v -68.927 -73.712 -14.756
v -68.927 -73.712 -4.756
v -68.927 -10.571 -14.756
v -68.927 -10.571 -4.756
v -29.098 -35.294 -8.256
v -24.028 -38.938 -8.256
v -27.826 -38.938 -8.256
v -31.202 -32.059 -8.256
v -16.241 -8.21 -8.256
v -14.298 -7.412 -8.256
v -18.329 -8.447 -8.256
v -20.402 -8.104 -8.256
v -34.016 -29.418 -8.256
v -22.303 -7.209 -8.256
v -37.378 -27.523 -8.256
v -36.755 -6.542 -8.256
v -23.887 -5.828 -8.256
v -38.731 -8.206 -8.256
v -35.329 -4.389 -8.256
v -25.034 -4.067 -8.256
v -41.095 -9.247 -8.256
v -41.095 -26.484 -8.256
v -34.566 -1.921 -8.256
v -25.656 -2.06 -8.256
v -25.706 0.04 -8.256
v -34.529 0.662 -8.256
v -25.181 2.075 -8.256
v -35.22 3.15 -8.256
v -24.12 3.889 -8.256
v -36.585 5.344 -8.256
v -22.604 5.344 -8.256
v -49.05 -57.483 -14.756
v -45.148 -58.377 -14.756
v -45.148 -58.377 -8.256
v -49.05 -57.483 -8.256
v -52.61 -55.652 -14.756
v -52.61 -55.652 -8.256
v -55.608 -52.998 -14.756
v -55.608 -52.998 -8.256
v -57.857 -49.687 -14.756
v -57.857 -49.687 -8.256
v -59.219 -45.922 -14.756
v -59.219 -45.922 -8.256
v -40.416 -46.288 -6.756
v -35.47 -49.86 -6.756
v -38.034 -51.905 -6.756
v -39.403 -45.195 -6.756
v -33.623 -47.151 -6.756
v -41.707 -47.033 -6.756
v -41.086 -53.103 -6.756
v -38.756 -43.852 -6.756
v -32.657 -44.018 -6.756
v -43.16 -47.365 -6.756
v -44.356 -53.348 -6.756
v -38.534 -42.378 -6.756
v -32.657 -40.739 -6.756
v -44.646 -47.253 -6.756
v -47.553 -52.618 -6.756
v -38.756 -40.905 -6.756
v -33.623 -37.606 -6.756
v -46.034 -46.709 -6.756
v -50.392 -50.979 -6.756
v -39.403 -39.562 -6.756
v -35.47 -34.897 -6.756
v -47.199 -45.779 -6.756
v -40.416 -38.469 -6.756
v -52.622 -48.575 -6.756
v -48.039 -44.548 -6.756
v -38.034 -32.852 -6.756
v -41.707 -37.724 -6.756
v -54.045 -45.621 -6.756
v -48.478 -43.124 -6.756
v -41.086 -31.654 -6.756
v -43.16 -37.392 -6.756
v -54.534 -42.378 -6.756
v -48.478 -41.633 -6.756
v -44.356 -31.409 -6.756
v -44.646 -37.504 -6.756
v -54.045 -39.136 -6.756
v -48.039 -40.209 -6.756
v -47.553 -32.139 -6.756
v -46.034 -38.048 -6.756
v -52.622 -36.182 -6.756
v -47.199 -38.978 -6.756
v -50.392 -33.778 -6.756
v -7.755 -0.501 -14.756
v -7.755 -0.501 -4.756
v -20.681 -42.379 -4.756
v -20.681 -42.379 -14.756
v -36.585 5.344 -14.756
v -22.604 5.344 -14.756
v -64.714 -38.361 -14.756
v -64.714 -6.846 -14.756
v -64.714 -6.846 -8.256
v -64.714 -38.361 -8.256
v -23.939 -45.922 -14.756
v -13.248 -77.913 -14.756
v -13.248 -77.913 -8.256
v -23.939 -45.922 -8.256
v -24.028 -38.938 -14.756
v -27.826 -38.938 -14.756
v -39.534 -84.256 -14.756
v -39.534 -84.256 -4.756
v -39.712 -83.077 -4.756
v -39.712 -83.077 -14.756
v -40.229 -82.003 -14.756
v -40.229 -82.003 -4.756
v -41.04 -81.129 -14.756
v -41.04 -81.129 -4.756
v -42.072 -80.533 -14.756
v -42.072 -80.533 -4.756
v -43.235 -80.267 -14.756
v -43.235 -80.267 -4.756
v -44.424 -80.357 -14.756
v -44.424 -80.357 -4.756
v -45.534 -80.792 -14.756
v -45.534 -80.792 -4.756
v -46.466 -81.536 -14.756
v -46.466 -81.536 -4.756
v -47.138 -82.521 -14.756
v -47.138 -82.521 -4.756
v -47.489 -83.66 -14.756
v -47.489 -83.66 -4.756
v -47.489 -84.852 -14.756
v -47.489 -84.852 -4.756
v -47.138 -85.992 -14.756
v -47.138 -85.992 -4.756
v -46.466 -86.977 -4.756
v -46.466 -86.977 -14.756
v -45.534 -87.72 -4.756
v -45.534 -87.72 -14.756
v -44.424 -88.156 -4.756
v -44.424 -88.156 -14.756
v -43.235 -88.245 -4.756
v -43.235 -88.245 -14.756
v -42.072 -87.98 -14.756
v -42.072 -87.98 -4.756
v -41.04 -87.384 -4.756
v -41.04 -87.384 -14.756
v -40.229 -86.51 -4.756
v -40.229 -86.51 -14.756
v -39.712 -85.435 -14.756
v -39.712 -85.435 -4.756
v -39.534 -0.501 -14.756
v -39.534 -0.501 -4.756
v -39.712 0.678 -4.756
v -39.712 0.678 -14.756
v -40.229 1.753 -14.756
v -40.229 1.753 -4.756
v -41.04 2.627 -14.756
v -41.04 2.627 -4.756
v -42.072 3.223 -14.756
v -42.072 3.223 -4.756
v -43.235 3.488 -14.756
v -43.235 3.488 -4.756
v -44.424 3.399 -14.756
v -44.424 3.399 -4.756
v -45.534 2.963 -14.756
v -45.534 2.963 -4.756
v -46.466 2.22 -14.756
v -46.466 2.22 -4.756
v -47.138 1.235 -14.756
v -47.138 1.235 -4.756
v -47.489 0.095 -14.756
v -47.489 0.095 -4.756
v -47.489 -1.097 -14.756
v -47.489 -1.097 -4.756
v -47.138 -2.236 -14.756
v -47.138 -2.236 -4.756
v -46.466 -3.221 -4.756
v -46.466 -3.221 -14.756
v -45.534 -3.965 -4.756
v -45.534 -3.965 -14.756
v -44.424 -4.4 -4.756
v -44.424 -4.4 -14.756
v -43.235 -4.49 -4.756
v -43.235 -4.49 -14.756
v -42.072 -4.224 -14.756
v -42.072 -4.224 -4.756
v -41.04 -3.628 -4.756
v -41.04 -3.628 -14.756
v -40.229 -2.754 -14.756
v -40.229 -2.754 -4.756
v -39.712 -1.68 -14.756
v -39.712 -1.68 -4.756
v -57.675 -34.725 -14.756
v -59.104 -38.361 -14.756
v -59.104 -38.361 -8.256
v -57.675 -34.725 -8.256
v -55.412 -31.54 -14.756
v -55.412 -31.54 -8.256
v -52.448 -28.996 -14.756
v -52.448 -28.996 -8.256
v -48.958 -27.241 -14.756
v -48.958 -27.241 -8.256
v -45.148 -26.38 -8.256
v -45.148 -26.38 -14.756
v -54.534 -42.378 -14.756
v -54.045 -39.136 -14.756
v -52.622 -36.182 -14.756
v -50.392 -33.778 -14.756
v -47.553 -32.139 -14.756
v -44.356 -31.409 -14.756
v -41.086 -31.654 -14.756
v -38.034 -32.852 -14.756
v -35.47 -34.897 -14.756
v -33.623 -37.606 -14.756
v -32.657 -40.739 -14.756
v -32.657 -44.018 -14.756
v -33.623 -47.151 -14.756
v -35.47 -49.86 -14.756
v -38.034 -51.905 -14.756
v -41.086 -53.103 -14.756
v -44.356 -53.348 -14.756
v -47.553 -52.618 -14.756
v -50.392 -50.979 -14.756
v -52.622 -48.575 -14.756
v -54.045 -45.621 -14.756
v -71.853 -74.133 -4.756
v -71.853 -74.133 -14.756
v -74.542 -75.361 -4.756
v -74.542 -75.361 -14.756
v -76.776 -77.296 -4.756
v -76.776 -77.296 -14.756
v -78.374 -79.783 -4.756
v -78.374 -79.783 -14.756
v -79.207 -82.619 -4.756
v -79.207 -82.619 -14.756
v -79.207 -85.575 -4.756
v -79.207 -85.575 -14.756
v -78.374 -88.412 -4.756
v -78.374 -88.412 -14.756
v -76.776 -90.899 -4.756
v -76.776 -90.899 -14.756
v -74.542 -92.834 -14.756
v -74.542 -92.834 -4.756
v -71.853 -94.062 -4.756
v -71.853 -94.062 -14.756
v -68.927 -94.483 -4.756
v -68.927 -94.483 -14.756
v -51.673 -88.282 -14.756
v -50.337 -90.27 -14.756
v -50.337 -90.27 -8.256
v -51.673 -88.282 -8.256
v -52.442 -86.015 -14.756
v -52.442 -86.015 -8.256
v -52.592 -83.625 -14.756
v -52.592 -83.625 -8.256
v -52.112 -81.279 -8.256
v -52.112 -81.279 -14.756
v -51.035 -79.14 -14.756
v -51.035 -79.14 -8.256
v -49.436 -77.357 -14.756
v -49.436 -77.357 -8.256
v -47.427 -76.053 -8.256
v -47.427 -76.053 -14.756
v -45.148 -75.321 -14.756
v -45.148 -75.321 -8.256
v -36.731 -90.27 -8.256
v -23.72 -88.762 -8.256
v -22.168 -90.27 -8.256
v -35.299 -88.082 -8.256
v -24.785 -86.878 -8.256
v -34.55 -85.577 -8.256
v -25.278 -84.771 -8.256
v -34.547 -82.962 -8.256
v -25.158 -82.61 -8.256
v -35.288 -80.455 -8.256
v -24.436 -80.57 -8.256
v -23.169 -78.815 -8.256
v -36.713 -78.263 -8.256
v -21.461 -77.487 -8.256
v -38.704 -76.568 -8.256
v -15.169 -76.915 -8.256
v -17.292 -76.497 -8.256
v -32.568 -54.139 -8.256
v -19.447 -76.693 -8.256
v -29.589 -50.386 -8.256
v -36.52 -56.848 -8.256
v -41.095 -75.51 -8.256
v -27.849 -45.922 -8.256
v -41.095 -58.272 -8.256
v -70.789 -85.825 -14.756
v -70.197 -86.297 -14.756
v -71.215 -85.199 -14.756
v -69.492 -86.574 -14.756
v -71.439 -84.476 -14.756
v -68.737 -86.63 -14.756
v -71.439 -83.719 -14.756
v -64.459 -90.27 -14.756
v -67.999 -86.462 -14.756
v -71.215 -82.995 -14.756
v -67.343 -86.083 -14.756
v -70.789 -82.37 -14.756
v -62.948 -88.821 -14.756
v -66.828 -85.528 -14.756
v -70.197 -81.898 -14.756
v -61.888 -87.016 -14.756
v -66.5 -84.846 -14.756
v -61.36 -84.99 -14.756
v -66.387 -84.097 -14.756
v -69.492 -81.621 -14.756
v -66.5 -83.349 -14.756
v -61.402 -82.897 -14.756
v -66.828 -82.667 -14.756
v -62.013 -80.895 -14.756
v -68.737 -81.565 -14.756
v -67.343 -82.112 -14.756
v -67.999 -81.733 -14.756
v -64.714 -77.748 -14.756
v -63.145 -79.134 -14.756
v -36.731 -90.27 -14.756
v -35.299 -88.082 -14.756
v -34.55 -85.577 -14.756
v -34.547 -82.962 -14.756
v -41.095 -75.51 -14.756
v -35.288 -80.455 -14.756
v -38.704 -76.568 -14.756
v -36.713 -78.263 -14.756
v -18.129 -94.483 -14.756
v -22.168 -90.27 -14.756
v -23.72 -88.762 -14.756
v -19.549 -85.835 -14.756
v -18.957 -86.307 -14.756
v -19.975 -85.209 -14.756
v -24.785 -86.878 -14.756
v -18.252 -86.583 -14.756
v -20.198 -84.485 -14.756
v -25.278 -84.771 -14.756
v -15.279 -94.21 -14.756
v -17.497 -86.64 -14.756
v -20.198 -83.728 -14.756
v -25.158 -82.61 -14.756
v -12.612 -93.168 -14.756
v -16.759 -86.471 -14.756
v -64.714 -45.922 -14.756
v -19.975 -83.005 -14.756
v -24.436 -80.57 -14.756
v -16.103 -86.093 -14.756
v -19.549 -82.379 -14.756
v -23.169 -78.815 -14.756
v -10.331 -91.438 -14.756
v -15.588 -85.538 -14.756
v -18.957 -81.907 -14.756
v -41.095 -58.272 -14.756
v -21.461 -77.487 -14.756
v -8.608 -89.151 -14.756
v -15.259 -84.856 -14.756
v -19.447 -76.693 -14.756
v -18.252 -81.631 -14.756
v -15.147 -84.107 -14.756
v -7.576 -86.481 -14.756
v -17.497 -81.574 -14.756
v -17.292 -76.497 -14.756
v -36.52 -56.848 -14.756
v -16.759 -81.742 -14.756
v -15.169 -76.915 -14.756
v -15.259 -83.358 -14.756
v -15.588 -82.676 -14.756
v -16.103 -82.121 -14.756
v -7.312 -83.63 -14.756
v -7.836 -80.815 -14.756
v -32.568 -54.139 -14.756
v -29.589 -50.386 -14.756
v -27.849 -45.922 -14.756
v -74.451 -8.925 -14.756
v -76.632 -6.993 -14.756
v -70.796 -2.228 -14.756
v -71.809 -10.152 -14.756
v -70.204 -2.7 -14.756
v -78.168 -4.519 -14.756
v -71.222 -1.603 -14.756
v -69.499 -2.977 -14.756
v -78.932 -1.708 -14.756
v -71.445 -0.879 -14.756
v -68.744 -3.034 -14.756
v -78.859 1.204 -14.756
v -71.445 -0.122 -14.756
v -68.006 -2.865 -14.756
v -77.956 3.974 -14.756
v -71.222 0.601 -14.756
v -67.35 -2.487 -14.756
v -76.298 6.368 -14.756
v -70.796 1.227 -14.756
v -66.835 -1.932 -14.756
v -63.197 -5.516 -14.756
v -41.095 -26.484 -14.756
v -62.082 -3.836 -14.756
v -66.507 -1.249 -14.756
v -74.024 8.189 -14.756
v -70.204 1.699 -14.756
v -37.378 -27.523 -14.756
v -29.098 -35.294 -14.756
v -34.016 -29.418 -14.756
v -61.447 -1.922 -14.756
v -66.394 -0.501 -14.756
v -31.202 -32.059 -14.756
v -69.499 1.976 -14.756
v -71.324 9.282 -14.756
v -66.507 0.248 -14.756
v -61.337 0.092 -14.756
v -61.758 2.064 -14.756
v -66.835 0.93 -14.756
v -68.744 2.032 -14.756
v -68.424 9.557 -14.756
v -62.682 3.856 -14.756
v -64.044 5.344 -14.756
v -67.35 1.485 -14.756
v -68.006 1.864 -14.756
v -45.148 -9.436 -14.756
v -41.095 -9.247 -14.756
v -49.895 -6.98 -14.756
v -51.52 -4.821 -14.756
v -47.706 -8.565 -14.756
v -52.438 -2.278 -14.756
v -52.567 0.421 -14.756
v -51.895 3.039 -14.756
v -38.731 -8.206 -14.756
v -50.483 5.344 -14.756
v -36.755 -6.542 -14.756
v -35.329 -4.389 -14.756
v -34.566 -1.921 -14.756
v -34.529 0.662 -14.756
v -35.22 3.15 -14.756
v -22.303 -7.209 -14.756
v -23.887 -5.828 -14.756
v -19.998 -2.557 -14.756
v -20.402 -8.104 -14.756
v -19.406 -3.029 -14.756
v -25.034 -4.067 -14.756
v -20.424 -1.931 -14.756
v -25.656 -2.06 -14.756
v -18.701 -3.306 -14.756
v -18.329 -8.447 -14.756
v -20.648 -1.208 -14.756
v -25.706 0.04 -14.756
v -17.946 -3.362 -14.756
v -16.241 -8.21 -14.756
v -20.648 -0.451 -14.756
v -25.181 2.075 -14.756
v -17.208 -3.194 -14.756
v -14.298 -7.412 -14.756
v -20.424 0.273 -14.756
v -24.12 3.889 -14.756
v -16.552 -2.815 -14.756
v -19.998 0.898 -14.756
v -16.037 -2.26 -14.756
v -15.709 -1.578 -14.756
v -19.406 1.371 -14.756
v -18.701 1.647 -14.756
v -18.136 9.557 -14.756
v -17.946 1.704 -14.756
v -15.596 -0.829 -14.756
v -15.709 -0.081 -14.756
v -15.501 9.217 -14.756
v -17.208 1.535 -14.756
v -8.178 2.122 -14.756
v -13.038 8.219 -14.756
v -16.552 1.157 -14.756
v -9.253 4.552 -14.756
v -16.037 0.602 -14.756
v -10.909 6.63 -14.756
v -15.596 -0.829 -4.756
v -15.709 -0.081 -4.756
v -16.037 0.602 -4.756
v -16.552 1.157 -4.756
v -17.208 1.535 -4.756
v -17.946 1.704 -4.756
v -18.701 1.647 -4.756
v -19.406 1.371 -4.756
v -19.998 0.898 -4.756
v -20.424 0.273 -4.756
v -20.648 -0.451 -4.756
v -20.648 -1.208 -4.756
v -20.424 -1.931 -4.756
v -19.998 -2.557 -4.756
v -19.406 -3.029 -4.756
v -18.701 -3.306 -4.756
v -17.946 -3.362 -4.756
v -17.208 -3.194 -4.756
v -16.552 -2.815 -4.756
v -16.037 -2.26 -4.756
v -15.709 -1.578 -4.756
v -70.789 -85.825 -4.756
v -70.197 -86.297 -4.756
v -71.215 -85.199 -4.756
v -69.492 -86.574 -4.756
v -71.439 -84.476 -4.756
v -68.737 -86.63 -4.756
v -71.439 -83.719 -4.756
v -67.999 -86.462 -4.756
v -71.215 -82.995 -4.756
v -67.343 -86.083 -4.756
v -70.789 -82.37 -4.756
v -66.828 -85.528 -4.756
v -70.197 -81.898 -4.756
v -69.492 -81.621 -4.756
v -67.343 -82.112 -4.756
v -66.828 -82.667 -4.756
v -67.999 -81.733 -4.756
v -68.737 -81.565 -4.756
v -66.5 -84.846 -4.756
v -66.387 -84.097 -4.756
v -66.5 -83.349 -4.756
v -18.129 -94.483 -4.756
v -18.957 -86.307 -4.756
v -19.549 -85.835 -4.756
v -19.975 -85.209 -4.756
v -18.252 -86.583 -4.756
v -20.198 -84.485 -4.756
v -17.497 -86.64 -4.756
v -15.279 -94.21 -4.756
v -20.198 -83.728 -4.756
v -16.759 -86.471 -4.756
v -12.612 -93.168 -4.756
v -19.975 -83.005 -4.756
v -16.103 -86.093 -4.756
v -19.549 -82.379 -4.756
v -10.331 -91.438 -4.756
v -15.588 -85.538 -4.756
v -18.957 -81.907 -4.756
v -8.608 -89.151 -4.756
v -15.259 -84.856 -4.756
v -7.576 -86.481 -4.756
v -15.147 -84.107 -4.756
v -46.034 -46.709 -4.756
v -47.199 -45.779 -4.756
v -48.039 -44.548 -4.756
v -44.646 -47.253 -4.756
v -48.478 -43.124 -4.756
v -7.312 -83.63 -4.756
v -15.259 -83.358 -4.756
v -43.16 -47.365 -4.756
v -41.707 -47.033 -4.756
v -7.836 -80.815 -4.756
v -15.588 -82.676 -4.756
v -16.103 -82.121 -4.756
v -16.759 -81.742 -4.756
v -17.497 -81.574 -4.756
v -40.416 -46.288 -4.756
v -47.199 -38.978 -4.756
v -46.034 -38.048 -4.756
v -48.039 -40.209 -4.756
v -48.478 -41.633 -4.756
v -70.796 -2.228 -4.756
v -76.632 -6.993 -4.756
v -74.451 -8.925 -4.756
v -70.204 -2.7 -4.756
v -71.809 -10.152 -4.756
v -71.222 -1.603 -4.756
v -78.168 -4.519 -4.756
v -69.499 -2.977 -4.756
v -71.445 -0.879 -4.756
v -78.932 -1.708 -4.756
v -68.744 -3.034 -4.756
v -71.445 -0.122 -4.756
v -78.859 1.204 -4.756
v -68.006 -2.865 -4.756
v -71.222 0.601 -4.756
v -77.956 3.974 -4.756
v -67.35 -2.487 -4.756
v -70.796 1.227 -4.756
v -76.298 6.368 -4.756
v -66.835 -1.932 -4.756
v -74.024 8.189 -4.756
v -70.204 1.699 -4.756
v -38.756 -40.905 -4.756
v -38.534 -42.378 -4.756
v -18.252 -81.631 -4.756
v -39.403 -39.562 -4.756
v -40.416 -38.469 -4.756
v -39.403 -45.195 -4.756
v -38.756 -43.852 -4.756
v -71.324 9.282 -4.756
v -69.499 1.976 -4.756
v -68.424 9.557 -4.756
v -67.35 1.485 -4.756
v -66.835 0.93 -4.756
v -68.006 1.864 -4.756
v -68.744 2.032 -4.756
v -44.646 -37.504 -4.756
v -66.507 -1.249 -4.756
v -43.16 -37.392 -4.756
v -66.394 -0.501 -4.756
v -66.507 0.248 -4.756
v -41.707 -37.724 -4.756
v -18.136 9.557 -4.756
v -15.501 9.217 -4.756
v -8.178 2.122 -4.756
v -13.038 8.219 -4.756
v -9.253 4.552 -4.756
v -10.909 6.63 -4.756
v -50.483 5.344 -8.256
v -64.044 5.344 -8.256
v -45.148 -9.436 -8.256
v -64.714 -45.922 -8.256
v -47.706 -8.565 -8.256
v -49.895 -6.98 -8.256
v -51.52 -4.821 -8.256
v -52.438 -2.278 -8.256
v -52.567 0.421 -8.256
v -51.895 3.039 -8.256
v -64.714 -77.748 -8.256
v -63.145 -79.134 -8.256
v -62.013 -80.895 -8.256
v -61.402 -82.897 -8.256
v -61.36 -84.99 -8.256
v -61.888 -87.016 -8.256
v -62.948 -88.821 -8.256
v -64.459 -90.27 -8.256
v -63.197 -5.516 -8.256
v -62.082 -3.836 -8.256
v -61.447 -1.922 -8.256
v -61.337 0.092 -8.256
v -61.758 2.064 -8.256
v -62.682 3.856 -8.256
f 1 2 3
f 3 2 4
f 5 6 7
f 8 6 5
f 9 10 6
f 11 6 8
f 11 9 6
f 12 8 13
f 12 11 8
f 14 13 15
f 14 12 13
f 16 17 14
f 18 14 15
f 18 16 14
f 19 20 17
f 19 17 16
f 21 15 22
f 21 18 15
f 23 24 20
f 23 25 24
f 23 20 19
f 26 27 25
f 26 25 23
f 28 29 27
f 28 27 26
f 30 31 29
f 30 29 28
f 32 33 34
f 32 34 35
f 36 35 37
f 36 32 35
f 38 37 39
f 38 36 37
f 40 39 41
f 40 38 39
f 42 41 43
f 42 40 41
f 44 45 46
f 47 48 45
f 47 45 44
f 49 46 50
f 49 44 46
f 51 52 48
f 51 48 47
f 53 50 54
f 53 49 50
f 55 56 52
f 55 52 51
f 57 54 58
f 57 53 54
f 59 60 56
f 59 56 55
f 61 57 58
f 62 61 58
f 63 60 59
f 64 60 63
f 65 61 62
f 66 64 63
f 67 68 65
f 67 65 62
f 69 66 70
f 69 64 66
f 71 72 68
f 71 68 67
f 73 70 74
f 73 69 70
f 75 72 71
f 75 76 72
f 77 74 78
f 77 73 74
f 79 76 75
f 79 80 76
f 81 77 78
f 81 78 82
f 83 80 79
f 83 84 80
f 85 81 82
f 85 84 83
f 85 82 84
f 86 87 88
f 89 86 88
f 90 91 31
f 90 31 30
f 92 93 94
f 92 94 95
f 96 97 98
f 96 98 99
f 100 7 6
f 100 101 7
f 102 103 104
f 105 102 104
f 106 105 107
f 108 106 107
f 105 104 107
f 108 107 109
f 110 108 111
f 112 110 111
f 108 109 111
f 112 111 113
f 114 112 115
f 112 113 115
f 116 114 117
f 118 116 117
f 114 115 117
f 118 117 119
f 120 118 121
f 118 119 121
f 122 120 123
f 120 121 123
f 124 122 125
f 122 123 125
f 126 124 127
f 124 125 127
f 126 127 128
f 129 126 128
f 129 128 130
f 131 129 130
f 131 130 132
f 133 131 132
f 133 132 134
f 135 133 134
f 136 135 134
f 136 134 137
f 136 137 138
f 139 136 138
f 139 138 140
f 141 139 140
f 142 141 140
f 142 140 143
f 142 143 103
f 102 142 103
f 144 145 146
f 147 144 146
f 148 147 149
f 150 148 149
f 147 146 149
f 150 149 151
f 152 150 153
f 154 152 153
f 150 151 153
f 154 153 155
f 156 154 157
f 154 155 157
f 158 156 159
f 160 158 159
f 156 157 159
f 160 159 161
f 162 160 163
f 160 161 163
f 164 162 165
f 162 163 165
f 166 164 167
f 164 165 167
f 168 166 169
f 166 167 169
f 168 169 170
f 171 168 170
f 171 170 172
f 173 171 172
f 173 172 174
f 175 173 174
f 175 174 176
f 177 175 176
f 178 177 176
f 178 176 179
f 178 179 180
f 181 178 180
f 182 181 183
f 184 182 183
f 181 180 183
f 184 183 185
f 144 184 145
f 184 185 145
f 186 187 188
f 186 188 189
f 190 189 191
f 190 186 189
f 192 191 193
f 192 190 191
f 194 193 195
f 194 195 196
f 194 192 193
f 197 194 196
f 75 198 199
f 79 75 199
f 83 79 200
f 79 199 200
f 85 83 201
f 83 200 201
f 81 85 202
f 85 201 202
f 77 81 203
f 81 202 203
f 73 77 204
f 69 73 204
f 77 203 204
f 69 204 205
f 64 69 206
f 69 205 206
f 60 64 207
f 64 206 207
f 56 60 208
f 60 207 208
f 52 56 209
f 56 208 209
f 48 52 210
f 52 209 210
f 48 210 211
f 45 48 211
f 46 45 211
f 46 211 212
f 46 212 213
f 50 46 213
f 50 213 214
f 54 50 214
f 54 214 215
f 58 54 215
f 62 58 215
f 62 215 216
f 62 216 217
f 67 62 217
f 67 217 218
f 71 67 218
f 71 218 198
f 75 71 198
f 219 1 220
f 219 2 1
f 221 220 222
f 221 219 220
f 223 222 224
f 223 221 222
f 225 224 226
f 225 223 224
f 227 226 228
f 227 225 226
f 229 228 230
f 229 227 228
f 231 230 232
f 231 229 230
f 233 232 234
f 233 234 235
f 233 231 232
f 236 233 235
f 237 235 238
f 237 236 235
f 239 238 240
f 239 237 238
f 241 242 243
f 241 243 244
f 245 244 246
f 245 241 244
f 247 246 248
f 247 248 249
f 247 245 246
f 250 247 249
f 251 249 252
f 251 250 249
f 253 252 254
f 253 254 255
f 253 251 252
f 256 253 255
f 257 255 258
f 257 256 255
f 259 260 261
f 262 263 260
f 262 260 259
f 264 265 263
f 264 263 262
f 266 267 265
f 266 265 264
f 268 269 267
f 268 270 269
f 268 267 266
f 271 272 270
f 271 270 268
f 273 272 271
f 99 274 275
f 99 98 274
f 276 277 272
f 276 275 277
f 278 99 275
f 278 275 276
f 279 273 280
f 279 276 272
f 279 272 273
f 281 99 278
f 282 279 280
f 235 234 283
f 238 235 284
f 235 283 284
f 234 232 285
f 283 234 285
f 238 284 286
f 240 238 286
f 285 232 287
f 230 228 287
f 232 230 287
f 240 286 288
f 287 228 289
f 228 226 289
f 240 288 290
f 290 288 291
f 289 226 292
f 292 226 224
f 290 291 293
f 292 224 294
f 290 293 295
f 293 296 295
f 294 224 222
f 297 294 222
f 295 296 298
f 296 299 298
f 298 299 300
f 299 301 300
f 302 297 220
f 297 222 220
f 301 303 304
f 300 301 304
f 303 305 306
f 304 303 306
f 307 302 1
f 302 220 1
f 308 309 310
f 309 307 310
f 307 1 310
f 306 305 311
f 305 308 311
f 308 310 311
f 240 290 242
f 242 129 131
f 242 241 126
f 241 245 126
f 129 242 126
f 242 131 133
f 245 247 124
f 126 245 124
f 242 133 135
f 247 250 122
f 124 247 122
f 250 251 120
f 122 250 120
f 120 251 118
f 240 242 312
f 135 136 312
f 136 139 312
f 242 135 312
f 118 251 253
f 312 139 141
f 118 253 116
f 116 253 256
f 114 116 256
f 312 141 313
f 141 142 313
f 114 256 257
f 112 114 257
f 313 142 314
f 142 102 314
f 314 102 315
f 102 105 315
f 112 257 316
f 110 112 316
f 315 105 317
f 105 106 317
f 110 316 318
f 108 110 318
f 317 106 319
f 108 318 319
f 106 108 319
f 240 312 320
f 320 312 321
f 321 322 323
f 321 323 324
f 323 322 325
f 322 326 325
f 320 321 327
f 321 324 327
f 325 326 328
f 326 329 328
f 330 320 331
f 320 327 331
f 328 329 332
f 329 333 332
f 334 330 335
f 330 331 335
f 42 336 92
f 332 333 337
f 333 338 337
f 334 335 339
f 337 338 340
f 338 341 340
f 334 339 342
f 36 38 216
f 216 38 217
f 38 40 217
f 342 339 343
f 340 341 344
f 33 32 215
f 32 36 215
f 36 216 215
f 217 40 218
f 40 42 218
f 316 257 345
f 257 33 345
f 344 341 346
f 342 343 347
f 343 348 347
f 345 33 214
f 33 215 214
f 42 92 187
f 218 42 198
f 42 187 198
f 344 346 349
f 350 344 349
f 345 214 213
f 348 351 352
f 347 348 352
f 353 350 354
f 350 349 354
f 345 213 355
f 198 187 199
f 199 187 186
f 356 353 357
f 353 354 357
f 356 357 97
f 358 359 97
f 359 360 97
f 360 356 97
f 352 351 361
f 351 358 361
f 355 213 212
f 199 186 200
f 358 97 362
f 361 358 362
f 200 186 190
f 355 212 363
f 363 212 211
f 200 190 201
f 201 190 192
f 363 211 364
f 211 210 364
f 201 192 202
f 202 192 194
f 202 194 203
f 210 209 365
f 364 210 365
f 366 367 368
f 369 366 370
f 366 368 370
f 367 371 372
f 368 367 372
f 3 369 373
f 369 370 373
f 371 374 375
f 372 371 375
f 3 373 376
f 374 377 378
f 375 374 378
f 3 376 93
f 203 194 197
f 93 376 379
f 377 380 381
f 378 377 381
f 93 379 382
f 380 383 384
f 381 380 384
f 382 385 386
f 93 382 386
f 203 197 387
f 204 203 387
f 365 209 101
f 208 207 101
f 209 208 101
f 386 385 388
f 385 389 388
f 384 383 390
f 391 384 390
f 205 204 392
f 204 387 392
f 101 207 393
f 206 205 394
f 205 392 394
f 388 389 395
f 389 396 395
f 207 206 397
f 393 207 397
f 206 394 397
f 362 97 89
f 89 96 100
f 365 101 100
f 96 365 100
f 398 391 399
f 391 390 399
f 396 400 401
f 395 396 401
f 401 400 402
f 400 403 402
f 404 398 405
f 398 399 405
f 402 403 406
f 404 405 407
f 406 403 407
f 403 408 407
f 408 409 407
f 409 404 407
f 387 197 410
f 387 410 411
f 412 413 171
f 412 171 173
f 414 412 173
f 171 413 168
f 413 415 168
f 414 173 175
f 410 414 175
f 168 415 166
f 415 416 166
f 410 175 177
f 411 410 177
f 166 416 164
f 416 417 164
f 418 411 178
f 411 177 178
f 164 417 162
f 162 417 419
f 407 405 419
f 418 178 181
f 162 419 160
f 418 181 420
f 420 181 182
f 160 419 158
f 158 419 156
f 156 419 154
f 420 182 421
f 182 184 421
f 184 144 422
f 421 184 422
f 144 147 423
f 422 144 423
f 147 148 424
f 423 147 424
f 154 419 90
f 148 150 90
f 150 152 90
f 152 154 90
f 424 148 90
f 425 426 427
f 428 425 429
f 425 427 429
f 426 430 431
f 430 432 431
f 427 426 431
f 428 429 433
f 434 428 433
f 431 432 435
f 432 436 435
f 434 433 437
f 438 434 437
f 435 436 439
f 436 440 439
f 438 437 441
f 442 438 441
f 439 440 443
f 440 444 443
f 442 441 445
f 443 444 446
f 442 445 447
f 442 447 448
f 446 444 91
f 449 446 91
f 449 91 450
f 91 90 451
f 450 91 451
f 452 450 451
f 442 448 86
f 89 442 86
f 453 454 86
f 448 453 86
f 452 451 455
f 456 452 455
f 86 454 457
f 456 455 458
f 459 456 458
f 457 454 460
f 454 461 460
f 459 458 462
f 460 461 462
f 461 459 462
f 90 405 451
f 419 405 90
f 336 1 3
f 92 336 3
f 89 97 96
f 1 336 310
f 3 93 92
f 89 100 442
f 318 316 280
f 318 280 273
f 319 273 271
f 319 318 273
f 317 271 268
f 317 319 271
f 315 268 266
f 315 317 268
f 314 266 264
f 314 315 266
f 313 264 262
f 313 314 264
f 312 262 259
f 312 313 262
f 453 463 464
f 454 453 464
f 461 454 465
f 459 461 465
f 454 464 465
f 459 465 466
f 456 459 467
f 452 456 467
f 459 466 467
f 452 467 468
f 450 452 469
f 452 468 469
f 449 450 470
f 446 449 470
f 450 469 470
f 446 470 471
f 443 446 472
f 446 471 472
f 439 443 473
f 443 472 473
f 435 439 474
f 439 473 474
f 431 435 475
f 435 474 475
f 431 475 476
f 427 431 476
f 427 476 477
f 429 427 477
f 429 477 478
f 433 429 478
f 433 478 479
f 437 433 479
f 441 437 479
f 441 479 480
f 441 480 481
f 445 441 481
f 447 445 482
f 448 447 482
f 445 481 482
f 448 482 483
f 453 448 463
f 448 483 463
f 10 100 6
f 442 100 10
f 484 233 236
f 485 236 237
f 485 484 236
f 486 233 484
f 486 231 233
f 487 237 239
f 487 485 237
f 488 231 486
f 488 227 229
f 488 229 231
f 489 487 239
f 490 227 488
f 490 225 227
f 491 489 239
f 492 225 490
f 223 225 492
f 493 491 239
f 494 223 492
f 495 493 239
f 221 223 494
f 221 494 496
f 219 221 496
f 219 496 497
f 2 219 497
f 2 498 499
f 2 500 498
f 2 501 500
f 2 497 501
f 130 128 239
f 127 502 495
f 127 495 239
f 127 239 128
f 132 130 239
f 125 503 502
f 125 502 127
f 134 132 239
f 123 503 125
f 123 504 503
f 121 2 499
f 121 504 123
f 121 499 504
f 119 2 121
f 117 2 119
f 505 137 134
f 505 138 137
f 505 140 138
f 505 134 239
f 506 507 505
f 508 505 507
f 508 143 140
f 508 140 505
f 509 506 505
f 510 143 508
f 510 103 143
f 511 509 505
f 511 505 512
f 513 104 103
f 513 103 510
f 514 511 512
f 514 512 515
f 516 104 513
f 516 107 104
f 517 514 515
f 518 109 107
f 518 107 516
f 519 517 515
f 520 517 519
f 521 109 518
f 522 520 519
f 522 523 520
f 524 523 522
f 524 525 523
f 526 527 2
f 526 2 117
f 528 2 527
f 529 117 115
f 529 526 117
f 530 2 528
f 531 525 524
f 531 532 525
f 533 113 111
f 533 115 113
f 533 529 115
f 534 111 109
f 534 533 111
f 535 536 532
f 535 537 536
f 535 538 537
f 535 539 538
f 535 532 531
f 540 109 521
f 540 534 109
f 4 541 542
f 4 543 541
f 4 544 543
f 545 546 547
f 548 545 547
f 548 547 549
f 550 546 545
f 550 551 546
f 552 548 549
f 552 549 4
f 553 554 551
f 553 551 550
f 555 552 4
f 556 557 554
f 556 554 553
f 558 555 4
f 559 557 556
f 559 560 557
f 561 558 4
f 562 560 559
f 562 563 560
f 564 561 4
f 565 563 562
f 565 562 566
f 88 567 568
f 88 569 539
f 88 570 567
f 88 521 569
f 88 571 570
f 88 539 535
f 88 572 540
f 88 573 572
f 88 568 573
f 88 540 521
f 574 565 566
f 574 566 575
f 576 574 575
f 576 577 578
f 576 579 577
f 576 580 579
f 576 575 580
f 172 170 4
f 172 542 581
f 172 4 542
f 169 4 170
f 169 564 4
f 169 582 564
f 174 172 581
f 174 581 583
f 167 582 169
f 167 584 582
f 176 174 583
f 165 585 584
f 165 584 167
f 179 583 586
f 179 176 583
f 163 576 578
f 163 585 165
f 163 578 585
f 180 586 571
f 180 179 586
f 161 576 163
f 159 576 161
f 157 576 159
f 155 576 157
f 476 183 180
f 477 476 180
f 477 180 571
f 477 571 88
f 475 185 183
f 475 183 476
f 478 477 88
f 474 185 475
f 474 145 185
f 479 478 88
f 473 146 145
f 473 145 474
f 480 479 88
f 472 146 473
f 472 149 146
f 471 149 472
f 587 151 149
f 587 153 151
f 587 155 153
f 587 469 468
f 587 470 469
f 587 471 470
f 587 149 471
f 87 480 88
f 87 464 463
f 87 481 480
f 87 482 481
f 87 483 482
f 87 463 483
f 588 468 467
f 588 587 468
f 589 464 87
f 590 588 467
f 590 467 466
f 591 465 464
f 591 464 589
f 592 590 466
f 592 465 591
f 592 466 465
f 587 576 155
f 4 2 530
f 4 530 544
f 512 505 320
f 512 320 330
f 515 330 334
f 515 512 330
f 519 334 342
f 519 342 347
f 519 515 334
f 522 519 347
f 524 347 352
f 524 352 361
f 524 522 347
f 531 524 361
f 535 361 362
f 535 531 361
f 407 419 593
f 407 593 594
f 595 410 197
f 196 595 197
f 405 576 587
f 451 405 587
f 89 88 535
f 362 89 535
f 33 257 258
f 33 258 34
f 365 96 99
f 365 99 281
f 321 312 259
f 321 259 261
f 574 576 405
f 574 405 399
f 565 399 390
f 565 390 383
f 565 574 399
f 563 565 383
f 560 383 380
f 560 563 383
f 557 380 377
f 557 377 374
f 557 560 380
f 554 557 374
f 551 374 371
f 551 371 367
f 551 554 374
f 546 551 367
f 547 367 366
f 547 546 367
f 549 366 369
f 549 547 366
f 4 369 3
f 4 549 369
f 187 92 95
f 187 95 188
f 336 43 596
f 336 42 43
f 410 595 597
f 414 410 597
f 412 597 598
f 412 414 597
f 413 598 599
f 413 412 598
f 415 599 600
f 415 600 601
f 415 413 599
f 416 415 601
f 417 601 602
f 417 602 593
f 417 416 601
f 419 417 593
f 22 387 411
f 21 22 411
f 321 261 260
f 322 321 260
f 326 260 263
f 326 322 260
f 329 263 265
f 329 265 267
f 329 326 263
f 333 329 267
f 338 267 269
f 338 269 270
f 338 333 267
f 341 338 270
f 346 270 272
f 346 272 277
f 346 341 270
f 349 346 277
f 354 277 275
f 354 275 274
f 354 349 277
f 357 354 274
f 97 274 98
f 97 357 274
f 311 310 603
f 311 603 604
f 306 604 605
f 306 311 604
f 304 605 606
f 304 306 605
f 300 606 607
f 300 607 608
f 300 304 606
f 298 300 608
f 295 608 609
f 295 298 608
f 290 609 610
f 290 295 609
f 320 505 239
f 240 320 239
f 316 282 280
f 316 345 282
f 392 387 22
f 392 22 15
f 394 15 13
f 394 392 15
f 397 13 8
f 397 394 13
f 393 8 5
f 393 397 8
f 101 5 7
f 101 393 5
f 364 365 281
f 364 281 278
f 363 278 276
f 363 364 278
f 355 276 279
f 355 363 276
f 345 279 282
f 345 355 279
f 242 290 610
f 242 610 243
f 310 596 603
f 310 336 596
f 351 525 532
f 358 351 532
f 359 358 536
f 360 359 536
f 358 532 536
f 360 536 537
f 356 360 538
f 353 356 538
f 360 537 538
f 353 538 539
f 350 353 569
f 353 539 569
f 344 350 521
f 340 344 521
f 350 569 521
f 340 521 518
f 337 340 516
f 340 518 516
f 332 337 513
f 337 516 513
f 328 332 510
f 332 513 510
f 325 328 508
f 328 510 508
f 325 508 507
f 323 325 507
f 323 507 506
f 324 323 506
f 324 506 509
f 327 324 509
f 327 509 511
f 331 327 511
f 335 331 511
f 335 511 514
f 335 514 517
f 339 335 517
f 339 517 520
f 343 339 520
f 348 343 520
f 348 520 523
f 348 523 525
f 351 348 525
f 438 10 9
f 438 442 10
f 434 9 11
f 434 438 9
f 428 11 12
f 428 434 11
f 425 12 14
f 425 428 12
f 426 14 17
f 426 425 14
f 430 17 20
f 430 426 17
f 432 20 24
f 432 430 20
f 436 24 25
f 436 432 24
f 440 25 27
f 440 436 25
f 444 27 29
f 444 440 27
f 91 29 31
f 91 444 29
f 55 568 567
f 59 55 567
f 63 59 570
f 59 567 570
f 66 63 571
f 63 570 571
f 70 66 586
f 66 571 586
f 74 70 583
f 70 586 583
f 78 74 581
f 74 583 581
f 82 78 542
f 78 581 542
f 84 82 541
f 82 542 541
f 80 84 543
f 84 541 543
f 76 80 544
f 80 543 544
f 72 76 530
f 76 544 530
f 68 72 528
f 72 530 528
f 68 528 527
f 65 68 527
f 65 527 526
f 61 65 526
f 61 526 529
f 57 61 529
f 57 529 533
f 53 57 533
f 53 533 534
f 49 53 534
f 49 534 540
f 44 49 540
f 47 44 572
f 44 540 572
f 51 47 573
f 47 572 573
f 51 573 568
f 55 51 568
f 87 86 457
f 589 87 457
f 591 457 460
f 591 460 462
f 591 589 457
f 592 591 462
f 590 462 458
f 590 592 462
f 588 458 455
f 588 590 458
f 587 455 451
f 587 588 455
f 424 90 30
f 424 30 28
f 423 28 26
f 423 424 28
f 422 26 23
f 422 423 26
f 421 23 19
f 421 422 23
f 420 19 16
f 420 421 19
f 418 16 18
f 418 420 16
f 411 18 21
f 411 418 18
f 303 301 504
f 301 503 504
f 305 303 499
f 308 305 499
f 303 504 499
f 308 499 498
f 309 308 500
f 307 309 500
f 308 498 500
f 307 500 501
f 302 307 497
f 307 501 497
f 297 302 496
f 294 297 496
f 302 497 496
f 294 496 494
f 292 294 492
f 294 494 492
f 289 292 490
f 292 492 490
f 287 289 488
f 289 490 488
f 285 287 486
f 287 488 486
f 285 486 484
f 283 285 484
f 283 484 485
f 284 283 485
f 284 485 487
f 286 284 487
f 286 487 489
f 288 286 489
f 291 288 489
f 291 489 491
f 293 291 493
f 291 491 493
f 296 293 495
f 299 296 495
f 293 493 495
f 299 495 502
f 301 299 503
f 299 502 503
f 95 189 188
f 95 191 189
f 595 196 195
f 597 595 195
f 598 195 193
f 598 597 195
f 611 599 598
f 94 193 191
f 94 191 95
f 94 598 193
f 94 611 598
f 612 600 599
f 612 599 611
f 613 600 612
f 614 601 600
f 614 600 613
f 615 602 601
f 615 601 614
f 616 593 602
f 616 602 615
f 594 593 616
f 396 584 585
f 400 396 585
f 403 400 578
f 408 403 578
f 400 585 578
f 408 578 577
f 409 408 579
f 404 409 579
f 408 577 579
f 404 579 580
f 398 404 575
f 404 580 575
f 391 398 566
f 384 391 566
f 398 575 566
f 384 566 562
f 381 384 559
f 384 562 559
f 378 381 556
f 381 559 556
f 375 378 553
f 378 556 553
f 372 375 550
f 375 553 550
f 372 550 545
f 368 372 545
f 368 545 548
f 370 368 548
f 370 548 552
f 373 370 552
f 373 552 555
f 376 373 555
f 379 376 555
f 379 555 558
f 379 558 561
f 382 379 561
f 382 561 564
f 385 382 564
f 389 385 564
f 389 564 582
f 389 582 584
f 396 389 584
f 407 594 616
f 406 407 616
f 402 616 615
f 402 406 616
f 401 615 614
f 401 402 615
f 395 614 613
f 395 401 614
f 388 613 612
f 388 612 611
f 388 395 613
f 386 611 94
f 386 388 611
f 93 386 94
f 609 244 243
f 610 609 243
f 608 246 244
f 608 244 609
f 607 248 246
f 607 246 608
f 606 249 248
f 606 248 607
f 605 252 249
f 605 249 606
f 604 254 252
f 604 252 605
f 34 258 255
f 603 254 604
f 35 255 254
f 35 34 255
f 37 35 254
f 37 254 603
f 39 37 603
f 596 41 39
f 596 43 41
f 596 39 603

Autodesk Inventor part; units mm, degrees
ref_plane "YZ Plane" through (0, 0, 0) normal (1, 0, 0) x (0, 1, 0)
ref_plane "XZ Plane" through (0, 0, 0) normal (0, 1, 0) x (-1, 0, 0)
ref_plane "XY Plane" through (0, 0, 0) normal (0, 0, 1) x (1, 0, 0)
ref_plane "Work Plane1" through (-43.5338, -0.5007, 1.2381) normal (0, 0, 1) x (1, 0, 0)
ref_plane "Work Plane2" through (-43.5338, -42.3785, -4.7563) normal (0, 0, 1) x (1, 0, 0)
sketch "Sketch1" plane through (-43.5338, -42.3785, -4.7563) normal (0, 0, 1) x (1, 0, 0)
  circle A0 centre (0, 41.8778) radius 4 projected
  circle A1 centre (0, 0) radius 4 projected
  circle A2 centre (0, -41.8778) radius 4 projected
  circle A3 centre (-25.4, 41.8778) radius 2.54
  circle A4 centre (-25.3932, -41.7189) radius 2.54
  circle A5 centre (25.3979, 41.5493) radius 2.54
  circle A6 centre (25.8472, -41.7284) radius 2.54
  arc A7 (-24.8901, 51.9352) -> (-25.3932, 31.8075) centre (-25.4, 41.8778) ccw
  arc A8 (-25.3932, -31.3333) -> (-25.3932, -52.1046) centre (-25.3932, -41.7189) ccw
  arc A9 (25.4047, -52.1046) -> (35.6974, -38.4367) centre (25.8472, -41.7284) ccw
  arc A10 (35.7786, 41.8776) -> (25.3979, 51.9352) centre (25.3979, 41.5493) ccw
  line L0 (-24.8901, 51.9352) -> (25.3979, 51.9352)
  line L1 (35.7786, 41.8776) -> (22.8529, -0.0002)
  line L2 (22.8529, -0.0002) -> (35.6974, -38.4367)
  line L3 (25.4047, -52.1046) -> (-25.3932, -52.1046)
  line L4 (-25.3932, -31.3333) -> (-25.3932, 31.8075)
  point P0 (43.5338, 42.3785)
  dimension "d0" = 5.08
  dimension "d1" = 25.4
  dimension "d2" = 5.08
  dimension "d3" = 5.08
  dimension "d4" = 5.08
  dimension "d5" = 25.4
extrude "Extrusion1" add sketch "Sketch1" against normal blind 10
sketch "Sketch2" plane through (-43.5338, -42.3785, -14.7563) normal (0, 0, -1) x (-1, 0, 0)
  circle A0 centre (0, -41.8778) radius 4 projected
  circle A1 centre (0, 0) radius 4 projected
  circle A2 centre (0, 41.8778) radius 4 projected
  circle A3 centre (-25.8472, -41.7284) radius 2.54 projected
  circle A4 centre (-25.3979, 41.5493) radius 2.54 projected
  circle A5 centre (25.3932, -41.7189) radius 2.54 projected
  circle A6 centre (25.4, 41.8778) radius 2.54 projected
  arc A7 (25.3932, 31.8075) -> (24.8901, 51.9352) centre (25.4, 41.8778) ccw projected
  line L0 (25.3932, 31.8075) -> (25.3932, -31.3333) projected
  arc A8 (25.3932, -52.1046) -> (25.3932, -31.3333) centre (25.3932, -41.7189) ccw projected
  line L1 (25.3932, -52.1046) -> (-25.4047, -52.1046) projected
  arc A9 (-35.6974, -38.4367) -> (-25.4047, -52.1046) centre (-25.8472, -41.7284) ccw projected
  line L2 (-35.6974, -38.4367) -> (-22.8529, -0.0002) projected
  line L3 (-22.8529, -0.0002) -> (-35.7786, 41.8776) projected
  arc A10 (-25.3979, 51.9352) -> (-35.7786, 41.8776) centre (-25.3979, 41.5493) ccw projected
  line L4 (-25.3979, 51.9352) -> (24.8901, 51.9352) projected
  circle A11 centre (0, 0) radius 11
  point P0 (-43.5338, 42.3785)
  dimension "d8" = 22
extrude "Extrusion2" cut sketch "Sketch2" against normal blind 8 contours A11
sketch "Sketch3" plane through (-43.5338, -42.3785, -4.7563) normal (0, 0, 1) x (1, 0, 0)
  circle A0 centre (0, 0) radius 5
  point P0 (43.5338, 42.3785)
  dimension "d11" = 10
extrude "Extrusion3" cut sketch "Sketch3" against normal blind 8
sketch "Sketch4" plane through (-43.5338, -42.3785, -14.7563) normal (0, 0, -1) x (-1, 0, 0)
  circle A0 centre (0, 0) radius 11 projected
  circle A1 centre (0, -41.8778) radius 4 projected
  circle A2 centre (0, 41.8778) radius 4 projected
  circle A3 centre (-25.8472, -41.7284) radius 2.54 projected
  circle A4 centre (-25.3979, 41.5493) radius 2.54 projected
  circle A5 centre (25.3932, -41.7189) radius 2.54 projected
  circle A6 centre (25.4, 41.8778) radius 2.54 projected
  arc A7 (25.3932, 31.8075) -> (24.8901, 51.9352) centre (25.4, 41.8778) ccw projected
  line L0 (24.8901, 51.9352) -> (-25.3979, 51.9352) projected
  arc A8 (-25.3979, 51.9352) -> (-35.7786, 41.8776) centre (-25.3979, 41.5493) ccw projected
  line L1 (-35.7786, 41.8776) -> (-22.8529, -0.0002) projected
  line L2 (-22.8529, -0.0002) -> (-35.6974, -38.4367) projected
  arc A9 (-35.6974, -38.4367) -> (-25.4047, -52.1046) centre (-25.8472, -41.7284) ccw projected
  line L3 (-25.4047, -52.1046) -> (25.3932, -52.1046) projected
  arc A10 (25.3932, -52.1046) -> (25.3932, -31.3333) centre (25.3932, -41.7189) ccw projected
  line L4 (25.3932, -31.3333) -> (25.3932, 31.8075) projected
  line L5 (-19.5055, 3.4405) -> (-29.2362, 34.9666)
  arc A11 (-26.1883, -47.8914) -> (-25.5061, -47.8914) centre (-25.8472, -41.7284) ccw
  line L6 (-30.2853, -35.5342) -> (-19.5947, -3.5433)
  circle A12 centre (0, 41.8778) radius 4 projected
  arc A13 (-29.2362, 34.9666) -> (-20.9299, 47.722) centre (-25.3979, 41.5493) ccw
  arc A14 (-21.366, -47.8914) -> (-30.2853, -35.5342) centre (-25.8472, -41.7284) ccw
  arc A15 (21.18, -35.3697) -> (20.925, -47.8914) centre (25.3932, -41.7189) ccw
  line L7 (-15.0962, 3.4405) -> (-19.5055, 3.4405)
  line L8 (-19.5947, -3.5433) -> (-15.0962, -3.5433)
  line L9 (21.18, 4.0176) -> (15.57, 4.0176)
  line L10 (15.6848, -3.5433) -> (21.18, -3.5433)
  line L11 (23.5004, 3.4405) -> (23.5004, 4.0176)
  line L12 (-2.4388, 15.894) -> (-2.4388, 33.1315)
  line L13 (1.6137, 32.9424) -> (1.6137, 15.9988)
  line L14 (-2.4388, -15.894) -> (-2.4388, -33.1315)
  line L15 (1.6137, -32.9424) -> (1.6137, -15.9988)
  line L16 (21.18, 35.533) -> (21.18, 4.0176)
  line L17 (21.18, -3.5433) -> (21.18, -37.208)
  arc A16 (20.5102, 47.722) -> (21.18, 35.533) centre (25.4, 41.8778) ccw
  line L18 (-20.9299, 47.722) -> (-6.9492, 47.722)
  line L19 (6.9492, 47.722) -> (20.5102, 47.722)
  arc A17 (15.57, 4.0176) -> (0.9078, 16.0544) centre (0, 0) ccw
  arc A18 (-2.4388, 15.894) -> (-15.7076, 3.4405) centre (0, 0) ccw
  arc A19 (-6.9492, 47.722) -> (-2.4388, 33.1315) centre (0, 41.8778) ccw
  arc A20 (1.6137, 32.9424) -> (6.9492, 47.722) centre (0, 41.8778) ccw
  arc A21 (-15.6848, -3.5433) -> (-1.8329, -15.9752) centre (0, 0) ccw
  arc A22 (0.9945, -16.0492) -> (15.6848, -3.5433) centre (0, 0) ccw
  arc A23 (-2.0453, -33.0312) -> (-6.8032, -47.8914) centre (0, -41.8778) ccw
  arc A24 (6.8032, -47.8914) -> (1.1925, -32.8765) centre (0, -41.8778) ccw
  line L20 (20.925, -47.8914) -> (6.8032, -47.8914)
  line L21 (-6.8032, -47.8914) -> (-21.366, -47.8914)
  point P0 (-43.5338, 42.3785)
  point P1 (18.8824, 0.2371)
  point P2 (-0.4126, 23.807)
  point P3 (-0.4126, -23.9098)
  dimension "d16" = 5.08
  dimension "d17" = 5.08
  dimension "d18" = 5.08
  dimension "d20" = 5.08
extrude "Extrusion4" cut sketch "Sketch4" against normal blind 6.5 contours L5 A13 L18 A19 L12 A18 L7 | L6 L8 A21 L14 A23 L21 A14 | A15 L20 A24 L15 A22 L10 L17 | L9 A17 L13 A20 L19 A16 L16
properties part number "Endstop"
